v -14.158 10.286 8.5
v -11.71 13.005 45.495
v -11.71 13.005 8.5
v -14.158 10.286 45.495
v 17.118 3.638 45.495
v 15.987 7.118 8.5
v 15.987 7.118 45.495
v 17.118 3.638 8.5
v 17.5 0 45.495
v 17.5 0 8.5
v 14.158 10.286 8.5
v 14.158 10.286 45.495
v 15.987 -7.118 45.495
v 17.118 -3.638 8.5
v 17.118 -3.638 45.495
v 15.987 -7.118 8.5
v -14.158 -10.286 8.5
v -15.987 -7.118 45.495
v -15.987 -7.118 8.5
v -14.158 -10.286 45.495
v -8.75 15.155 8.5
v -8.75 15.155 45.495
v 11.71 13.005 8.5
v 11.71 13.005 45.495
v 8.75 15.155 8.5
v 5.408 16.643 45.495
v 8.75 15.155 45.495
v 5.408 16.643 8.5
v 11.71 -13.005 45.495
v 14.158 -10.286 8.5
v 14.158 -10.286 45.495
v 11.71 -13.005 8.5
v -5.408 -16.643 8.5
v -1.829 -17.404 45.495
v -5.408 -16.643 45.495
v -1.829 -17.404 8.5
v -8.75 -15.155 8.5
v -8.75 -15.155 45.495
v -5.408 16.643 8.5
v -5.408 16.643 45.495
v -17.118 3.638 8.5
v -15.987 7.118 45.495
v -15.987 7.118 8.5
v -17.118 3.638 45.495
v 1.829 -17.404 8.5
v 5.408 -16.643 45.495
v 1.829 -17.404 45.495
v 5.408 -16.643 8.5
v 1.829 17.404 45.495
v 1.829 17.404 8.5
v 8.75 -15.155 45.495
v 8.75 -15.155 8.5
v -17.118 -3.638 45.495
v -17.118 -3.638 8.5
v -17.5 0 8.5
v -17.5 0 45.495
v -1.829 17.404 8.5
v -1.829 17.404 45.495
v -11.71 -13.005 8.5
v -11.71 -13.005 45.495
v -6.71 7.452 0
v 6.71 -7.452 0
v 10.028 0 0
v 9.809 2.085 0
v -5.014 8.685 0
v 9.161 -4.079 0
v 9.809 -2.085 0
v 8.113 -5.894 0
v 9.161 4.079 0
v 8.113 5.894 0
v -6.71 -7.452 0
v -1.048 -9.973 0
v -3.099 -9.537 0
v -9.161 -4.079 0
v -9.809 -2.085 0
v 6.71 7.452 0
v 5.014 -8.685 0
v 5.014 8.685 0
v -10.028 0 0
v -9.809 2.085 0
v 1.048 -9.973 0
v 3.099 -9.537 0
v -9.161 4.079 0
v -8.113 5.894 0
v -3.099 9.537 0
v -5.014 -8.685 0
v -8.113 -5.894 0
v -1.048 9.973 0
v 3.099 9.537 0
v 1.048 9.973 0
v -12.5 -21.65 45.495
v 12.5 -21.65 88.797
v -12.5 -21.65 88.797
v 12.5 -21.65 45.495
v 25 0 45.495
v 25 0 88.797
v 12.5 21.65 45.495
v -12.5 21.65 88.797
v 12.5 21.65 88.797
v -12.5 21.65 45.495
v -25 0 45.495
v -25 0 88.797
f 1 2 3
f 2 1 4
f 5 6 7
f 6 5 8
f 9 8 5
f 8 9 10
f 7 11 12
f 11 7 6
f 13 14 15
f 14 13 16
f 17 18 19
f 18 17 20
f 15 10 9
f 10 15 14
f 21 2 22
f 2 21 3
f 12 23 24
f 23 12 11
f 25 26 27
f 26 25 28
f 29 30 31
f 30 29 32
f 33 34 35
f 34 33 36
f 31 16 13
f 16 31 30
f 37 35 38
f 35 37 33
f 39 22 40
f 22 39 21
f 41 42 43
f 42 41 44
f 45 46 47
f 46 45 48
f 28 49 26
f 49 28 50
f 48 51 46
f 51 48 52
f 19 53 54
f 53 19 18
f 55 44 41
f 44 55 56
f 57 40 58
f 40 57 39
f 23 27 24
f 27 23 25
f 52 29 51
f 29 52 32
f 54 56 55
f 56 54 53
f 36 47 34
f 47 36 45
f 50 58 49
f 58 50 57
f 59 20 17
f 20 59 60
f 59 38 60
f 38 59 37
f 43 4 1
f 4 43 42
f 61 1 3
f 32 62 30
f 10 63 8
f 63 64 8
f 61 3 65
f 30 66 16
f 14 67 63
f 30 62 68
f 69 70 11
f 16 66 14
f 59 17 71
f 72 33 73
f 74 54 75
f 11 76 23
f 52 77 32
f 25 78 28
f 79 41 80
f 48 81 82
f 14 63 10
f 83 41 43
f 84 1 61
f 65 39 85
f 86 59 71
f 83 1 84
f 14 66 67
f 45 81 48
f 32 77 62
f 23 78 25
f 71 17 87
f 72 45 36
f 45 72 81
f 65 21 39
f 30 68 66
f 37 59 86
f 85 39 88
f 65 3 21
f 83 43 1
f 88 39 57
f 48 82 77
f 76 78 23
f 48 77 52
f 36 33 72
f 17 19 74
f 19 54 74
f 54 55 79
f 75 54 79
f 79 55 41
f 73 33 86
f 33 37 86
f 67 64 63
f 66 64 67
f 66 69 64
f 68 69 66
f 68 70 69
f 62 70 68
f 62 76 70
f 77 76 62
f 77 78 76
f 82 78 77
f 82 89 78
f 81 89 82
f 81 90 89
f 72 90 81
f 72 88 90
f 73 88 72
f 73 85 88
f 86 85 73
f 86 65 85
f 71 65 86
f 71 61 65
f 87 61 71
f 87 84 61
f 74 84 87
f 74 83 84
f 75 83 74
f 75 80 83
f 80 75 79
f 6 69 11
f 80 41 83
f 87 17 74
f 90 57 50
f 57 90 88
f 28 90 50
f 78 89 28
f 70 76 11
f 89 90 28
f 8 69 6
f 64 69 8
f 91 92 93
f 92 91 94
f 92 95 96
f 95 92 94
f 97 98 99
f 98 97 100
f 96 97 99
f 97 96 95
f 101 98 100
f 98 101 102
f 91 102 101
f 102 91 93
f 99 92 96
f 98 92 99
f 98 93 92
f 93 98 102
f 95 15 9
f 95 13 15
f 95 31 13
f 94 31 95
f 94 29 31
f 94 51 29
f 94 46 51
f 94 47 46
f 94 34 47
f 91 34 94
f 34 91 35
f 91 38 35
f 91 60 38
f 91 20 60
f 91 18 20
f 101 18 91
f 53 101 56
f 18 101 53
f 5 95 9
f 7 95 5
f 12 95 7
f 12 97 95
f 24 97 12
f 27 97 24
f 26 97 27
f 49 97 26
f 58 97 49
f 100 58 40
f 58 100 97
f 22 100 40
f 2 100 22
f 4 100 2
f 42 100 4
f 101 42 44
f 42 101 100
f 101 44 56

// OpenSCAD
module hex_of_p2p_r_n(h = 1, n = 1) {
	cylinder(h = n, r = n / sqrt(3), $fn = 6, center = true);
}

module motor_end() {
	translate([0, 0, 8.50]) {
		cylinder(h = 37, r = 35 / 2);
	}
	translate([0, 0, 0]) {
		cylinder(h = 8.50, r2 = 35 / 2, r1 = 20.056 / 2);
	}
}

module ultraplanetary_gearbox() {
	translate([0, 0, (46 / 2) + (44.146)]) {
		hex_of_p2p_r_n(h = 46, n = 43.301);
	}
}

module neo_550() {
	motor_end();
	ultraplanetary_gearbox();
}

neo_550();
